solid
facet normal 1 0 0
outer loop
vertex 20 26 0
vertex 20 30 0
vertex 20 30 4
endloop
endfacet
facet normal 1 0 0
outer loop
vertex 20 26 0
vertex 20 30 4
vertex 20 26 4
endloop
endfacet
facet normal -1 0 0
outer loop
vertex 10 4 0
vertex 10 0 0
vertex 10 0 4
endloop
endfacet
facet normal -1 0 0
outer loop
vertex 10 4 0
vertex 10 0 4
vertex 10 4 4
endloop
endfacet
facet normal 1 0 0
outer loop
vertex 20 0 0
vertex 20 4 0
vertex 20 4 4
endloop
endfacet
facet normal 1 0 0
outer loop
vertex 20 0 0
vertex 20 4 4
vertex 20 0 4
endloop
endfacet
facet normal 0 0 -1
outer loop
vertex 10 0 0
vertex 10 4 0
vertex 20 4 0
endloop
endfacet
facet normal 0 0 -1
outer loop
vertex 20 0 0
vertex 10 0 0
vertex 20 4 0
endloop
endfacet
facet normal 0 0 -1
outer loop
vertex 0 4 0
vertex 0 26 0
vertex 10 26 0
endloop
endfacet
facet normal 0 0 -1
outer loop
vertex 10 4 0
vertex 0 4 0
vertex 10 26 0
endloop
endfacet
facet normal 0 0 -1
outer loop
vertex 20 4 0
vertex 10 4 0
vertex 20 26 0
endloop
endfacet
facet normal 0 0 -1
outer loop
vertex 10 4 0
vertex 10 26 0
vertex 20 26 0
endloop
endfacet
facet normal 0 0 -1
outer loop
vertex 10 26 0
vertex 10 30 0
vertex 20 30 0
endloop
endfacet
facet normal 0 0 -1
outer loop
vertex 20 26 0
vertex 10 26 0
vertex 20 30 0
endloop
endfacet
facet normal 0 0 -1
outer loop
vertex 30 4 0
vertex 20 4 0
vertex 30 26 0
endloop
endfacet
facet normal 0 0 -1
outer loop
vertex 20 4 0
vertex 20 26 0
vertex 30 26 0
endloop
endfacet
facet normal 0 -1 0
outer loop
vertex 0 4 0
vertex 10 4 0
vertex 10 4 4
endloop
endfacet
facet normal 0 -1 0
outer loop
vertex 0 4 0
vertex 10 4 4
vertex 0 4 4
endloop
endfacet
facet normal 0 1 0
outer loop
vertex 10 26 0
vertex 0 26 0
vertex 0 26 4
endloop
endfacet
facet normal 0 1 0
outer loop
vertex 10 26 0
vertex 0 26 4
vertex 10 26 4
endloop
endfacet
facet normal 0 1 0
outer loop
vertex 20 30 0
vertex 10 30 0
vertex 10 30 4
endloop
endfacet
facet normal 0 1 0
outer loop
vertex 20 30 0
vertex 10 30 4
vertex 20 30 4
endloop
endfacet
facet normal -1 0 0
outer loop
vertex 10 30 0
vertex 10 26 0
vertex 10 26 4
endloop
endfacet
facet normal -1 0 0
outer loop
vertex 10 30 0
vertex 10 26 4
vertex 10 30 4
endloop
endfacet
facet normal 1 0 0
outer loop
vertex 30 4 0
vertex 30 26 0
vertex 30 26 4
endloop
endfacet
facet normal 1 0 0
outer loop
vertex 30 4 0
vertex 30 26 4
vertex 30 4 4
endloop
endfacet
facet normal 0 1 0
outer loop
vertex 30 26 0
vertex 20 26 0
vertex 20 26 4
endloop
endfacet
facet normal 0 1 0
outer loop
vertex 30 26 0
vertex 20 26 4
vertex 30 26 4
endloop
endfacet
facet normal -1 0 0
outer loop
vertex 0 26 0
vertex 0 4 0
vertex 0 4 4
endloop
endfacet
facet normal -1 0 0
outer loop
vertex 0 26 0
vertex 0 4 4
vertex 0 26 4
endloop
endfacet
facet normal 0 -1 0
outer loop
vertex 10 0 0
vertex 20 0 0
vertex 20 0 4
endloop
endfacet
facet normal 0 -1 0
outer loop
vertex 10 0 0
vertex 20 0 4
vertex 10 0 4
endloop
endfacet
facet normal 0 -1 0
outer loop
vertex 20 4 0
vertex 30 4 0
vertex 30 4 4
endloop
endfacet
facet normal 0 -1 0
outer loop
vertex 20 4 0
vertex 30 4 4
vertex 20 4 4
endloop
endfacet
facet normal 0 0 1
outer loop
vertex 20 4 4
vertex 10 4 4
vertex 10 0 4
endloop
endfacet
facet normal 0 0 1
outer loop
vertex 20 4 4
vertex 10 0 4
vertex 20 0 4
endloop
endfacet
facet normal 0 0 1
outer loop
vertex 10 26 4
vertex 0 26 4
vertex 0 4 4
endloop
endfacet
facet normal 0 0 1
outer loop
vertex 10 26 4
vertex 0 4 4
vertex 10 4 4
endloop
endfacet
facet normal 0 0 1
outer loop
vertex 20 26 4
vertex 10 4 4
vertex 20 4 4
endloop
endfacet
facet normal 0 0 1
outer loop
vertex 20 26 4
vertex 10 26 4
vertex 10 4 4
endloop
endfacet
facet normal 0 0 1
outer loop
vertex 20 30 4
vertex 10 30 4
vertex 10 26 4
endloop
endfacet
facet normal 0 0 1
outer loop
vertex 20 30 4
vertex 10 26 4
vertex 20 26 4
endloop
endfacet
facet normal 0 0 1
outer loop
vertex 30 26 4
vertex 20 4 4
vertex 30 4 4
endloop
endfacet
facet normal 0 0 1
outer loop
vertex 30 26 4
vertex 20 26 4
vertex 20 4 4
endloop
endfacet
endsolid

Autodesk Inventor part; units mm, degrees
ref_plane "YZ Plane" through (0, 0, 0) normal (1, 0, 0) x (0, 1, 0)
ref_plane "XZ Plane" through (0, 0, 0) normal (0, 1, 0) x (-1, 0, 0)
ref_plane "XY Plane" through (0, 0, 0) normal (0, 0, 1) x (1, 0, 0)
sketch "Sketch1" plane through (0, 0, 0) normal (0, 0, 1) x (1, 0, 0)
  line L0 (0, 4) -> (0, 26)
  line L1 (0, 26) -> (10, 26)
  line L2 (10, 26) -> (10, 30)
  line L3 (10, 30) -> (20, 30)
  line L4 (20, 30) -> (20, 26)
  line L5 (20, 26) -> (30, 26)
  line L6 (30, 26) -> (30, 4)
  line L7 (30, 4) -> (20, 4)
  line L8 (20, 4) -> (20, 0)
  line L9 (20, 0) -> (10, 0)
  line L10 (10, 0) -> (10, 4)
  line L11 (10, 4) -> (0, 4)
  point P0 (0, 0)
  dimension "d0" = 22
  dimension "d1" = 10
  dimension "d2" = 4
  dimension "d3" = 10
  dimension "d4" = 10
extrude "Extrusion1" add sketch "Sketch1" along normal blind 4
properties part number "innanverdurstubbur"
